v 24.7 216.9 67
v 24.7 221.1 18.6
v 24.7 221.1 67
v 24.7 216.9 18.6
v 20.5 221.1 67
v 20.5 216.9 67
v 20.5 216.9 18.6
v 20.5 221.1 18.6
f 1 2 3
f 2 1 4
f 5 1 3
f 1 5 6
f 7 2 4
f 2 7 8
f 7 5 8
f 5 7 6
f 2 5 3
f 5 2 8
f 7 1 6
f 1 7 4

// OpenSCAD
// Generated by spec/prepare_parent_retrofit_printing.py from validated release fasteners. NOT A PRINTABLE PART.
union(){
translate([20.5, 216.9, 18.599999237060548]) cube([4.2, 4.2, 48.400003814697264]);
translate([20.5, 216.9, 18.599999237060548]) cube([4.2, 4.2, 48.400003814697264]);
}
